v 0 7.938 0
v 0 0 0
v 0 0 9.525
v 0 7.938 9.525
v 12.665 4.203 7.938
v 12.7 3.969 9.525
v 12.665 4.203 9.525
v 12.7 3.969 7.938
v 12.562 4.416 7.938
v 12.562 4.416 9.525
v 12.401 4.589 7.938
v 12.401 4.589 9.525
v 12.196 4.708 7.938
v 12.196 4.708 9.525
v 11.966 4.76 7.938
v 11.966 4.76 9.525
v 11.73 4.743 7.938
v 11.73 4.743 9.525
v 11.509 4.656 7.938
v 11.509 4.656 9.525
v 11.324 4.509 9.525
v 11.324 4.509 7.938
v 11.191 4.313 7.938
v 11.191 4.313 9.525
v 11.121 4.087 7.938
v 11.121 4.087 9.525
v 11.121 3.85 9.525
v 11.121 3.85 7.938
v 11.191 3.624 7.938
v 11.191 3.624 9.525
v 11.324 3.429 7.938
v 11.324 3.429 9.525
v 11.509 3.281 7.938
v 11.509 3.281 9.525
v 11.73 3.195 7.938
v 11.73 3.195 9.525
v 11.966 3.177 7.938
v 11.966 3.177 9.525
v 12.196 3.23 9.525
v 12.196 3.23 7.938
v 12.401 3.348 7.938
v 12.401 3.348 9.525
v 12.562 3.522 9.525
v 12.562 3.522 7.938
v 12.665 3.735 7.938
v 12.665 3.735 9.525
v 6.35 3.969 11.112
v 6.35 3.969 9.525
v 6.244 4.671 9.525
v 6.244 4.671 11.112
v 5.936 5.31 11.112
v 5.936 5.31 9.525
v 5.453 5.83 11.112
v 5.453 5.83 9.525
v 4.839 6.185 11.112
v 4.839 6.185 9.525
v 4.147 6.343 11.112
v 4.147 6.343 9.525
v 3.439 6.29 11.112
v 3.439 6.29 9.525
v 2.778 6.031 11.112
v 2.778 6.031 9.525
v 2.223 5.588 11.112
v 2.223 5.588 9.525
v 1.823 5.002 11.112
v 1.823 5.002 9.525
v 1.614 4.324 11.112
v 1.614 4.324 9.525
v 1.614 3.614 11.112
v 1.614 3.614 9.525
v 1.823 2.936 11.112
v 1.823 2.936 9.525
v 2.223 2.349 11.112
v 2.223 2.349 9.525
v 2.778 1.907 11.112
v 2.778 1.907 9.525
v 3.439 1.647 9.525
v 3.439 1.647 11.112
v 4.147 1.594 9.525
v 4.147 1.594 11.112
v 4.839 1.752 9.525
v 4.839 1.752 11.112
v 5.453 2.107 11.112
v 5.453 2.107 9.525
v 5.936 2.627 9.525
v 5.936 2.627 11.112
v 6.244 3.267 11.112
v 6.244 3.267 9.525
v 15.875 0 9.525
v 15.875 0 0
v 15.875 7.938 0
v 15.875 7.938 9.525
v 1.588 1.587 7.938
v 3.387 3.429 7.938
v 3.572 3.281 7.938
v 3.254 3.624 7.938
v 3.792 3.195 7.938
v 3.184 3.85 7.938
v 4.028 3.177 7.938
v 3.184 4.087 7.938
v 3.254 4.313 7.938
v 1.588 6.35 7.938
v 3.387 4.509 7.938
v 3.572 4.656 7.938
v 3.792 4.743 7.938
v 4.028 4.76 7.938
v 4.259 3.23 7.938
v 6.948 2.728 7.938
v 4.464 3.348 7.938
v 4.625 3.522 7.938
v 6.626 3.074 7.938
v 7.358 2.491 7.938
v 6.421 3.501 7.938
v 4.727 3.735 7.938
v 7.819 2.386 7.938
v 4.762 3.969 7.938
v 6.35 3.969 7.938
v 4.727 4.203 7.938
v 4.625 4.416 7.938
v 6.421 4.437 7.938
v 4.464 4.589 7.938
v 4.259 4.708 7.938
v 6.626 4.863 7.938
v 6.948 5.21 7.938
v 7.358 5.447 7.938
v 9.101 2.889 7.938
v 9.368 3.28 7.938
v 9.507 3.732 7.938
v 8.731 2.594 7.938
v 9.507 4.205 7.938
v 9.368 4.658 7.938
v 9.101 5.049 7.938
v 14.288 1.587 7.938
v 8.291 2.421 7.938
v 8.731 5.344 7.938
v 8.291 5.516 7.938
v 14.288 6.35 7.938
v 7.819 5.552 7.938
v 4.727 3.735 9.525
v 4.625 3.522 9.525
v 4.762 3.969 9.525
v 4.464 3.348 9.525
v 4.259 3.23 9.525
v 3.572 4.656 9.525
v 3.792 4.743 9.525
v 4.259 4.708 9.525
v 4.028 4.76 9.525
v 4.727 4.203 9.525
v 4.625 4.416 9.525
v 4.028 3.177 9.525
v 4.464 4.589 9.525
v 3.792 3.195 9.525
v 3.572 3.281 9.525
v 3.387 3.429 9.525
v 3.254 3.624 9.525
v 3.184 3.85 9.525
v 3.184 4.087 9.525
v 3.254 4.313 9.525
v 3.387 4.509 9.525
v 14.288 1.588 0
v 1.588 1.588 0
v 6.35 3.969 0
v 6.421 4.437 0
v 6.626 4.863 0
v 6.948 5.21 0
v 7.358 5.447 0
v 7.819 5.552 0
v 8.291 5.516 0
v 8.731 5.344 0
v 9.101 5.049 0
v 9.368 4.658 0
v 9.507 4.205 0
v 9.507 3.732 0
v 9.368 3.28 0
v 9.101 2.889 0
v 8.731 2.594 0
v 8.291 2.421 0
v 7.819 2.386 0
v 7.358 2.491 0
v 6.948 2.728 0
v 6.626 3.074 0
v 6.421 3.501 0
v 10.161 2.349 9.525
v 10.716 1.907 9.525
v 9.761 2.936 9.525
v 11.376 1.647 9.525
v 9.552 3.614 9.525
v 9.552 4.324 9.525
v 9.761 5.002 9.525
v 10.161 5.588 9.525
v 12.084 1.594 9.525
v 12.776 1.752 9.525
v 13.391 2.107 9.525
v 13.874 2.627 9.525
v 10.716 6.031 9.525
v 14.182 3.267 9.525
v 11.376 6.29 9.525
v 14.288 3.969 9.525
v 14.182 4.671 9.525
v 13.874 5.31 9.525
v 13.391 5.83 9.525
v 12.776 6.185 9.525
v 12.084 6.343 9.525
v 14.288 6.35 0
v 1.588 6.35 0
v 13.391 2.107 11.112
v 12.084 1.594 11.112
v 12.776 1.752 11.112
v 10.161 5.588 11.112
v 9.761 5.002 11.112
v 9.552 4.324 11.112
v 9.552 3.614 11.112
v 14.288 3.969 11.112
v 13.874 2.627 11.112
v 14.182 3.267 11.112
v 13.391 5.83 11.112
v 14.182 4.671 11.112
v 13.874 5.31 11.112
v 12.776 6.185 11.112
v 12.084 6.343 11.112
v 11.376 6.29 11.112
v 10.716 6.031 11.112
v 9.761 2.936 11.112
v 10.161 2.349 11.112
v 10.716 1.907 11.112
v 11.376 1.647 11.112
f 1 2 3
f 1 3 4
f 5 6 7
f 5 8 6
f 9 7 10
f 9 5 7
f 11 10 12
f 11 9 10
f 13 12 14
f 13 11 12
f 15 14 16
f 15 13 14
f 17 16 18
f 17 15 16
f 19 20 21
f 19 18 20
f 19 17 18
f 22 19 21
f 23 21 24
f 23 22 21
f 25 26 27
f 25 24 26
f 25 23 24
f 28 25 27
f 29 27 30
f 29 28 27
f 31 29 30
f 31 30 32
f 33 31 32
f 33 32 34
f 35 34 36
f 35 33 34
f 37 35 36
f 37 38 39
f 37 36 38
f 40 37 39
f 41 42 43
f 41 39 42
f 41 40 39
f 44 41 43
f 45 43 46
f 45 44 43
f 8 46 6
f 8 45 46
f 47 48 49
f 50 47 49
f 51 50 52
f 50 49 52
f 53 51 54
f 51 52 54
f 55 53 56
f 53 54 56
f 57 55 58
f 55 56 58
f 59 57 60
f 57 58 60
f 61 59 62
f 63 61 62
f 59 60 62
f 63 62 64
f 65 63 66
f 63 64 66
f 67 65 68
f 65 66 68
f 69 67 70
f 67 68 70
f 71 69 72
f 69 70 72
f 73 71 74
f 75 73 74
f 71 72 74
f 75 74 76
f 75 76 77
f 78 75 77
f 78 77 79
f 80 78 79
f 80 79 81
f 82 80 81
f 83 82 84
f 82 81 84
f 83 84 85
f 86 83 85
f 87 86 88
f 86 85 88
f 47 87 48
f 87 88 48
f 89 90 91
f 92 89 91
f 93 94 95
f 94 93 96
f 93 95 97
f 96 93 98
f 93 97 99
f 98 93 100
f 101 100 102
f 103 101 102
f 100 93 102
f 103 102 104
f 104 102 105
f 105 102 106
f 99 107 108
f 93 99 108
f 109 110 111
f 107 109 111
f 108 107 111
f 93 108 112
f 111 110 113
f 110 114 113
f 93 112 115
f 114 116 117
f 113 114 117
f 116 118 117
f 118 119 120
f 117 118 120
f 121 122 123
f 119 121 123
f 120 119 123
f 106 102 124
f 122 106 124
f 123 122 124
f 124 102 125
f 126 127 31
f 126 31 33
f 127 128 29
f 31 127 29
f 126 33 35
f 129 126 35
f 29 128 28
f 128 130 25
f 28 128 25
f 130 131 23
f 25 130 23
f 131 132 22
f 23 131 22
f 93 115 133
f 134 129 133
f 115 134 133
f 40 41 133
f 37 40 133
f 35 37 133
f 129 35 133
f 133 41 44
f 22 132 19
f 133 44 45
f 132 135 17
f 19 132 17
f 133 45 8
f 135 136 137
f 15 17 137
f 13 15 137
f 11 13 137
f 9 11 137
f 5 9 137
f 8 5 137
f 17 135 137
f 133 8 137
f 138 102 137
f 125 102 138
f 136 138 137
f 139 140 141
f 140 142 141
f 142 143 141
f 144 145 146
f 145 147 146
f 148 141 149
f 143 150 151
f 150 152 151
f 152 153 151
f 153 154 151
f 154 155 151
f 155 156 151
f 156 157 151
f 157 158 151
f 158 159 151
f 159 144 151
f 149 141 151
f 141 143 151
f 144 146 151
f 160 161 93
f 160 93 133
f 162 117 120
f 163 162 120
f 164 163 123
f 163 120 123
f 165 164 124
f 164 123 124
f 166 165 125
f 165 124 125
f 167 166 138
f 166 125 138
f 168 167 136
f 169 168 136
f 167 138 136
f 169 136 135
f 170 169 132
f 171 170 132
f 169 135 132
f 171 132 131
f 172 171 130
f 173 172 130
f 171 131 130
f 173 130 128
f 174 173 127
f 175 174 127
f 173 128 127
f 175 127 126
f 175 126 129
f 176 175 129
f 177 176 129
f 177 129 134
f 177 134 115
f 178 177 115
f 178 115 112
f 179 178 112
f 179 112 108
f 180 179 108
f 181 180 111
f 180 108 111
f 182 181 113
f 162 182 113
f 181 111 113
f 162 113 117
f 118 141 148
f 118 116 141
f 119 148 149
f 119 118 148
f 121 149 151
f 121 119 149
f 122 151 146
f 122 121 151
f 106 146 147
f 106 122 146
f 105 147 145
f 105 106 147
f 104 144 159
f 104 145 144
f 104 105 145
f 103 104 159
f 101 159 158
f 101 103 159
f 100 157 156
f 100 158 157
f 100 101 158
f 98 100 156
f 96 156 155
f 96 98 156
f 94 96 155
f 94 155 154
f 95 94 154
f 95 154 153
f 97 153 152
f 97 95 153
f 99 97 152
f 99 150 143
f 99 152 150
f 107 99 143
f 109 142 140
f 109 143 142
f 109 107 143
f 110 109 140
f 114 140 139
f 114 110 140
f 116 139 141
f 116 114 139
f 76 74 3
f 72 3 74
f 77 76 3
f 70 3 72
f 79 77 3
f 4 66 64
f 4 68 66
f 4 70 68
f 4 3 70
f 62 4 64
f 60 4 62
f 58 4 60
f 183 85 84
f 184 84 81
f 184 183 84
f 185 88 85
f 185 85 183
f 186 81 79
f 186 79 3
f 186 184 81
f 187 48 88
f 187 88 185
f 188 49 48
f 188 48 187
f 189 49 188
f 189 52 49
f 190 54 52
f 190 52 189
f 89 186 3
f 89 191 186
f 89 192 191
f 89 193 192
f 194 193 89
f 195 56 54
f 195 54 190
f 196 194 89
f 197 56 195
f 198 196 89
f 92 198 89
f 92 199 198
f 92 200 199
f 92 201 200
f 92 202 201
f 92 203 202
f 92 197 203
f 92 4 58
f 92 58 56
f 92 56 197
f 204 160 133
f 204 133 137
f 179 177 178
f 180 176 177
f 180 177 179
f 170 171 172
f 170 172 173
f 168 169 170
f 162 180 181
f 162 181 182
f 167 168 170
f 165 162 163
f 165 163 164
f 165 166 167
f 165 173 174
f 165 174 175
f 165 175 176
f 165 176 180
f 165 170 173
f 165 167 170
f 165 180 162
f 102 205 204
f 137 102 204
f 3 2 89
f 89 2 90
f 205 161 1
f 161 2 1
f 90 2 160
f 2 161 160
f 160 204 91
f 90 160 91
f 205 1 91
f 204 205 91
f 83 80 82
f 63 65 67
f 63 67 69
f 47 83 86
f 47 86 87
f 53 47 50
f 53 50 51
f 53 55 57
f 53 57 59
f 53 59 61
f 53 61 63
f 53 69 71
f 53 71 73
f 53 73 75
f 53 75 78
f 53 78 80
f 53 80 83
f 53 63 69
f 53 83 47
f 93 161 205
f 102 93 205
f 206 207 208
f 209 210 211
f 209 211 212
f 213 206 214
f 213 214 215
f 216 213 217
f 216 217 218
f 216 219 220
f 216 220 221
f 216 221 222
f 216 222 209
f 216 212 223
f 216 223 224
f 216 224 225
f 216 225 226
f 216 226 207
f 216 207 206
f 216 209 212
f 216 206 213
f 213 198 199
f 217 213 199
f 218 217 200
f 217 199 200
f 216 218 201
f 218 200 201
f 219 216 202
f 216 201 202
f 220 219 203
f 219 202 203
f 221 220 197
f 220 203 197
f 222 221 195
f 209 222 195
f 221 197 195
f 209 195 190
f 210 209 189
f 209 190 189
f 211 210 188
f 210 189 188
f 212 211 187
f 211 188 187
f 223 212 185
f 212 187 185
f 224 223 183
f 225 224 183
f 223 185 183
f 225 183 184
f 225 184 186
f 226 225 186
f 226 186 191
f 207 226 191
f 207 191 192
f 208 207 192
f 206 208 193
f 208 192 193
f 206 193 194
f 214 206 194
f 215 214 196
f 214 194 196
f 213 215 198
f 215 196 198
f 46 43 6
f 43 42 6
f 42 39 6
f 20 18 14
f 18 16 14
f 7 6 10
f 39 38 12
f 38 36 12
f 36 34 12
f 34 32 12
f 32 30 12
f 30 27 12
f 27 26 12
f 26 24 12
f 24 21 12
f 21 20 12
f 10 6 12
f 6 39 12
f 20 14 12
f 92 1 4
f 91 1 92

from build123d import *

# Parameters (mm, degrees)
SKETCH1_W           = 15.875
SKETCH1_H           = 7.9375
BOSS_EXTRUDE1_DEPTH = 9.525
SKETCH2_R           = 2.38125
BOSS_EXTRUDE2_DEPTH = 1.5875
LPATTERN1_COUNT     = 2
LPATTERN1_PITCH     = 7.9375
SHELL3_T            = -1.5875
SKETCH3_R           = 1.5875
BOSS_EXTRUDE3_DEPTH = 7.9375


with BuildPart() as part:
    # Sketch1 → Boss-Extrude1 (new body)
    with BuildSketch(Plane.XY):
        with Locations((7.9375, 3.96875)):
            Rectangle(SKETCH1_W, SKETCH1_H)
    extrude(amount=BOSS_EXTRUDE1_DEPTH)

    # Sketch2 → Boss-Extrude2 (add)
    with BuildSketch(Plane.XY.offset(9.525)):
        with Locations((3.96875, 3.96875)):
            Circle(SKETCH2_R)
    boss_extrude2 = extrude(amount=BOSS_EXTRUDE2_DEPTH)

    # LPattern1: Boss-Extrude2 ×2
    with Locations(*[(i * LPATTERN1_PITCH, 0, 0) for i in range(1, LPATTERN1_COUNT)]):
        add(boss_extrude2)

    # Shell3
    shell3_openings = [part.faces().sort_by_distance(p)[0] for p in [
        (7.9375, 3.96875, 0),
    ]]
    offset(amount=SHELL3_T, openings=shell3_openings, kind=Kind.INTERSECTION)

    # Sketch3 → Boss-Extrude3 (add)
    with BuildSketch(Plane(origin=(0, 0, 7.9375), x_dir=(-1, 0, 0), z_dir=(0, 0, -1))):
        with Locations((-7.9375, 3.96875)):
            Circle(SKETCH3_R)
    extrude(amount=BOSS_EXTRUDE3_DEPTH)


solid = part.part
